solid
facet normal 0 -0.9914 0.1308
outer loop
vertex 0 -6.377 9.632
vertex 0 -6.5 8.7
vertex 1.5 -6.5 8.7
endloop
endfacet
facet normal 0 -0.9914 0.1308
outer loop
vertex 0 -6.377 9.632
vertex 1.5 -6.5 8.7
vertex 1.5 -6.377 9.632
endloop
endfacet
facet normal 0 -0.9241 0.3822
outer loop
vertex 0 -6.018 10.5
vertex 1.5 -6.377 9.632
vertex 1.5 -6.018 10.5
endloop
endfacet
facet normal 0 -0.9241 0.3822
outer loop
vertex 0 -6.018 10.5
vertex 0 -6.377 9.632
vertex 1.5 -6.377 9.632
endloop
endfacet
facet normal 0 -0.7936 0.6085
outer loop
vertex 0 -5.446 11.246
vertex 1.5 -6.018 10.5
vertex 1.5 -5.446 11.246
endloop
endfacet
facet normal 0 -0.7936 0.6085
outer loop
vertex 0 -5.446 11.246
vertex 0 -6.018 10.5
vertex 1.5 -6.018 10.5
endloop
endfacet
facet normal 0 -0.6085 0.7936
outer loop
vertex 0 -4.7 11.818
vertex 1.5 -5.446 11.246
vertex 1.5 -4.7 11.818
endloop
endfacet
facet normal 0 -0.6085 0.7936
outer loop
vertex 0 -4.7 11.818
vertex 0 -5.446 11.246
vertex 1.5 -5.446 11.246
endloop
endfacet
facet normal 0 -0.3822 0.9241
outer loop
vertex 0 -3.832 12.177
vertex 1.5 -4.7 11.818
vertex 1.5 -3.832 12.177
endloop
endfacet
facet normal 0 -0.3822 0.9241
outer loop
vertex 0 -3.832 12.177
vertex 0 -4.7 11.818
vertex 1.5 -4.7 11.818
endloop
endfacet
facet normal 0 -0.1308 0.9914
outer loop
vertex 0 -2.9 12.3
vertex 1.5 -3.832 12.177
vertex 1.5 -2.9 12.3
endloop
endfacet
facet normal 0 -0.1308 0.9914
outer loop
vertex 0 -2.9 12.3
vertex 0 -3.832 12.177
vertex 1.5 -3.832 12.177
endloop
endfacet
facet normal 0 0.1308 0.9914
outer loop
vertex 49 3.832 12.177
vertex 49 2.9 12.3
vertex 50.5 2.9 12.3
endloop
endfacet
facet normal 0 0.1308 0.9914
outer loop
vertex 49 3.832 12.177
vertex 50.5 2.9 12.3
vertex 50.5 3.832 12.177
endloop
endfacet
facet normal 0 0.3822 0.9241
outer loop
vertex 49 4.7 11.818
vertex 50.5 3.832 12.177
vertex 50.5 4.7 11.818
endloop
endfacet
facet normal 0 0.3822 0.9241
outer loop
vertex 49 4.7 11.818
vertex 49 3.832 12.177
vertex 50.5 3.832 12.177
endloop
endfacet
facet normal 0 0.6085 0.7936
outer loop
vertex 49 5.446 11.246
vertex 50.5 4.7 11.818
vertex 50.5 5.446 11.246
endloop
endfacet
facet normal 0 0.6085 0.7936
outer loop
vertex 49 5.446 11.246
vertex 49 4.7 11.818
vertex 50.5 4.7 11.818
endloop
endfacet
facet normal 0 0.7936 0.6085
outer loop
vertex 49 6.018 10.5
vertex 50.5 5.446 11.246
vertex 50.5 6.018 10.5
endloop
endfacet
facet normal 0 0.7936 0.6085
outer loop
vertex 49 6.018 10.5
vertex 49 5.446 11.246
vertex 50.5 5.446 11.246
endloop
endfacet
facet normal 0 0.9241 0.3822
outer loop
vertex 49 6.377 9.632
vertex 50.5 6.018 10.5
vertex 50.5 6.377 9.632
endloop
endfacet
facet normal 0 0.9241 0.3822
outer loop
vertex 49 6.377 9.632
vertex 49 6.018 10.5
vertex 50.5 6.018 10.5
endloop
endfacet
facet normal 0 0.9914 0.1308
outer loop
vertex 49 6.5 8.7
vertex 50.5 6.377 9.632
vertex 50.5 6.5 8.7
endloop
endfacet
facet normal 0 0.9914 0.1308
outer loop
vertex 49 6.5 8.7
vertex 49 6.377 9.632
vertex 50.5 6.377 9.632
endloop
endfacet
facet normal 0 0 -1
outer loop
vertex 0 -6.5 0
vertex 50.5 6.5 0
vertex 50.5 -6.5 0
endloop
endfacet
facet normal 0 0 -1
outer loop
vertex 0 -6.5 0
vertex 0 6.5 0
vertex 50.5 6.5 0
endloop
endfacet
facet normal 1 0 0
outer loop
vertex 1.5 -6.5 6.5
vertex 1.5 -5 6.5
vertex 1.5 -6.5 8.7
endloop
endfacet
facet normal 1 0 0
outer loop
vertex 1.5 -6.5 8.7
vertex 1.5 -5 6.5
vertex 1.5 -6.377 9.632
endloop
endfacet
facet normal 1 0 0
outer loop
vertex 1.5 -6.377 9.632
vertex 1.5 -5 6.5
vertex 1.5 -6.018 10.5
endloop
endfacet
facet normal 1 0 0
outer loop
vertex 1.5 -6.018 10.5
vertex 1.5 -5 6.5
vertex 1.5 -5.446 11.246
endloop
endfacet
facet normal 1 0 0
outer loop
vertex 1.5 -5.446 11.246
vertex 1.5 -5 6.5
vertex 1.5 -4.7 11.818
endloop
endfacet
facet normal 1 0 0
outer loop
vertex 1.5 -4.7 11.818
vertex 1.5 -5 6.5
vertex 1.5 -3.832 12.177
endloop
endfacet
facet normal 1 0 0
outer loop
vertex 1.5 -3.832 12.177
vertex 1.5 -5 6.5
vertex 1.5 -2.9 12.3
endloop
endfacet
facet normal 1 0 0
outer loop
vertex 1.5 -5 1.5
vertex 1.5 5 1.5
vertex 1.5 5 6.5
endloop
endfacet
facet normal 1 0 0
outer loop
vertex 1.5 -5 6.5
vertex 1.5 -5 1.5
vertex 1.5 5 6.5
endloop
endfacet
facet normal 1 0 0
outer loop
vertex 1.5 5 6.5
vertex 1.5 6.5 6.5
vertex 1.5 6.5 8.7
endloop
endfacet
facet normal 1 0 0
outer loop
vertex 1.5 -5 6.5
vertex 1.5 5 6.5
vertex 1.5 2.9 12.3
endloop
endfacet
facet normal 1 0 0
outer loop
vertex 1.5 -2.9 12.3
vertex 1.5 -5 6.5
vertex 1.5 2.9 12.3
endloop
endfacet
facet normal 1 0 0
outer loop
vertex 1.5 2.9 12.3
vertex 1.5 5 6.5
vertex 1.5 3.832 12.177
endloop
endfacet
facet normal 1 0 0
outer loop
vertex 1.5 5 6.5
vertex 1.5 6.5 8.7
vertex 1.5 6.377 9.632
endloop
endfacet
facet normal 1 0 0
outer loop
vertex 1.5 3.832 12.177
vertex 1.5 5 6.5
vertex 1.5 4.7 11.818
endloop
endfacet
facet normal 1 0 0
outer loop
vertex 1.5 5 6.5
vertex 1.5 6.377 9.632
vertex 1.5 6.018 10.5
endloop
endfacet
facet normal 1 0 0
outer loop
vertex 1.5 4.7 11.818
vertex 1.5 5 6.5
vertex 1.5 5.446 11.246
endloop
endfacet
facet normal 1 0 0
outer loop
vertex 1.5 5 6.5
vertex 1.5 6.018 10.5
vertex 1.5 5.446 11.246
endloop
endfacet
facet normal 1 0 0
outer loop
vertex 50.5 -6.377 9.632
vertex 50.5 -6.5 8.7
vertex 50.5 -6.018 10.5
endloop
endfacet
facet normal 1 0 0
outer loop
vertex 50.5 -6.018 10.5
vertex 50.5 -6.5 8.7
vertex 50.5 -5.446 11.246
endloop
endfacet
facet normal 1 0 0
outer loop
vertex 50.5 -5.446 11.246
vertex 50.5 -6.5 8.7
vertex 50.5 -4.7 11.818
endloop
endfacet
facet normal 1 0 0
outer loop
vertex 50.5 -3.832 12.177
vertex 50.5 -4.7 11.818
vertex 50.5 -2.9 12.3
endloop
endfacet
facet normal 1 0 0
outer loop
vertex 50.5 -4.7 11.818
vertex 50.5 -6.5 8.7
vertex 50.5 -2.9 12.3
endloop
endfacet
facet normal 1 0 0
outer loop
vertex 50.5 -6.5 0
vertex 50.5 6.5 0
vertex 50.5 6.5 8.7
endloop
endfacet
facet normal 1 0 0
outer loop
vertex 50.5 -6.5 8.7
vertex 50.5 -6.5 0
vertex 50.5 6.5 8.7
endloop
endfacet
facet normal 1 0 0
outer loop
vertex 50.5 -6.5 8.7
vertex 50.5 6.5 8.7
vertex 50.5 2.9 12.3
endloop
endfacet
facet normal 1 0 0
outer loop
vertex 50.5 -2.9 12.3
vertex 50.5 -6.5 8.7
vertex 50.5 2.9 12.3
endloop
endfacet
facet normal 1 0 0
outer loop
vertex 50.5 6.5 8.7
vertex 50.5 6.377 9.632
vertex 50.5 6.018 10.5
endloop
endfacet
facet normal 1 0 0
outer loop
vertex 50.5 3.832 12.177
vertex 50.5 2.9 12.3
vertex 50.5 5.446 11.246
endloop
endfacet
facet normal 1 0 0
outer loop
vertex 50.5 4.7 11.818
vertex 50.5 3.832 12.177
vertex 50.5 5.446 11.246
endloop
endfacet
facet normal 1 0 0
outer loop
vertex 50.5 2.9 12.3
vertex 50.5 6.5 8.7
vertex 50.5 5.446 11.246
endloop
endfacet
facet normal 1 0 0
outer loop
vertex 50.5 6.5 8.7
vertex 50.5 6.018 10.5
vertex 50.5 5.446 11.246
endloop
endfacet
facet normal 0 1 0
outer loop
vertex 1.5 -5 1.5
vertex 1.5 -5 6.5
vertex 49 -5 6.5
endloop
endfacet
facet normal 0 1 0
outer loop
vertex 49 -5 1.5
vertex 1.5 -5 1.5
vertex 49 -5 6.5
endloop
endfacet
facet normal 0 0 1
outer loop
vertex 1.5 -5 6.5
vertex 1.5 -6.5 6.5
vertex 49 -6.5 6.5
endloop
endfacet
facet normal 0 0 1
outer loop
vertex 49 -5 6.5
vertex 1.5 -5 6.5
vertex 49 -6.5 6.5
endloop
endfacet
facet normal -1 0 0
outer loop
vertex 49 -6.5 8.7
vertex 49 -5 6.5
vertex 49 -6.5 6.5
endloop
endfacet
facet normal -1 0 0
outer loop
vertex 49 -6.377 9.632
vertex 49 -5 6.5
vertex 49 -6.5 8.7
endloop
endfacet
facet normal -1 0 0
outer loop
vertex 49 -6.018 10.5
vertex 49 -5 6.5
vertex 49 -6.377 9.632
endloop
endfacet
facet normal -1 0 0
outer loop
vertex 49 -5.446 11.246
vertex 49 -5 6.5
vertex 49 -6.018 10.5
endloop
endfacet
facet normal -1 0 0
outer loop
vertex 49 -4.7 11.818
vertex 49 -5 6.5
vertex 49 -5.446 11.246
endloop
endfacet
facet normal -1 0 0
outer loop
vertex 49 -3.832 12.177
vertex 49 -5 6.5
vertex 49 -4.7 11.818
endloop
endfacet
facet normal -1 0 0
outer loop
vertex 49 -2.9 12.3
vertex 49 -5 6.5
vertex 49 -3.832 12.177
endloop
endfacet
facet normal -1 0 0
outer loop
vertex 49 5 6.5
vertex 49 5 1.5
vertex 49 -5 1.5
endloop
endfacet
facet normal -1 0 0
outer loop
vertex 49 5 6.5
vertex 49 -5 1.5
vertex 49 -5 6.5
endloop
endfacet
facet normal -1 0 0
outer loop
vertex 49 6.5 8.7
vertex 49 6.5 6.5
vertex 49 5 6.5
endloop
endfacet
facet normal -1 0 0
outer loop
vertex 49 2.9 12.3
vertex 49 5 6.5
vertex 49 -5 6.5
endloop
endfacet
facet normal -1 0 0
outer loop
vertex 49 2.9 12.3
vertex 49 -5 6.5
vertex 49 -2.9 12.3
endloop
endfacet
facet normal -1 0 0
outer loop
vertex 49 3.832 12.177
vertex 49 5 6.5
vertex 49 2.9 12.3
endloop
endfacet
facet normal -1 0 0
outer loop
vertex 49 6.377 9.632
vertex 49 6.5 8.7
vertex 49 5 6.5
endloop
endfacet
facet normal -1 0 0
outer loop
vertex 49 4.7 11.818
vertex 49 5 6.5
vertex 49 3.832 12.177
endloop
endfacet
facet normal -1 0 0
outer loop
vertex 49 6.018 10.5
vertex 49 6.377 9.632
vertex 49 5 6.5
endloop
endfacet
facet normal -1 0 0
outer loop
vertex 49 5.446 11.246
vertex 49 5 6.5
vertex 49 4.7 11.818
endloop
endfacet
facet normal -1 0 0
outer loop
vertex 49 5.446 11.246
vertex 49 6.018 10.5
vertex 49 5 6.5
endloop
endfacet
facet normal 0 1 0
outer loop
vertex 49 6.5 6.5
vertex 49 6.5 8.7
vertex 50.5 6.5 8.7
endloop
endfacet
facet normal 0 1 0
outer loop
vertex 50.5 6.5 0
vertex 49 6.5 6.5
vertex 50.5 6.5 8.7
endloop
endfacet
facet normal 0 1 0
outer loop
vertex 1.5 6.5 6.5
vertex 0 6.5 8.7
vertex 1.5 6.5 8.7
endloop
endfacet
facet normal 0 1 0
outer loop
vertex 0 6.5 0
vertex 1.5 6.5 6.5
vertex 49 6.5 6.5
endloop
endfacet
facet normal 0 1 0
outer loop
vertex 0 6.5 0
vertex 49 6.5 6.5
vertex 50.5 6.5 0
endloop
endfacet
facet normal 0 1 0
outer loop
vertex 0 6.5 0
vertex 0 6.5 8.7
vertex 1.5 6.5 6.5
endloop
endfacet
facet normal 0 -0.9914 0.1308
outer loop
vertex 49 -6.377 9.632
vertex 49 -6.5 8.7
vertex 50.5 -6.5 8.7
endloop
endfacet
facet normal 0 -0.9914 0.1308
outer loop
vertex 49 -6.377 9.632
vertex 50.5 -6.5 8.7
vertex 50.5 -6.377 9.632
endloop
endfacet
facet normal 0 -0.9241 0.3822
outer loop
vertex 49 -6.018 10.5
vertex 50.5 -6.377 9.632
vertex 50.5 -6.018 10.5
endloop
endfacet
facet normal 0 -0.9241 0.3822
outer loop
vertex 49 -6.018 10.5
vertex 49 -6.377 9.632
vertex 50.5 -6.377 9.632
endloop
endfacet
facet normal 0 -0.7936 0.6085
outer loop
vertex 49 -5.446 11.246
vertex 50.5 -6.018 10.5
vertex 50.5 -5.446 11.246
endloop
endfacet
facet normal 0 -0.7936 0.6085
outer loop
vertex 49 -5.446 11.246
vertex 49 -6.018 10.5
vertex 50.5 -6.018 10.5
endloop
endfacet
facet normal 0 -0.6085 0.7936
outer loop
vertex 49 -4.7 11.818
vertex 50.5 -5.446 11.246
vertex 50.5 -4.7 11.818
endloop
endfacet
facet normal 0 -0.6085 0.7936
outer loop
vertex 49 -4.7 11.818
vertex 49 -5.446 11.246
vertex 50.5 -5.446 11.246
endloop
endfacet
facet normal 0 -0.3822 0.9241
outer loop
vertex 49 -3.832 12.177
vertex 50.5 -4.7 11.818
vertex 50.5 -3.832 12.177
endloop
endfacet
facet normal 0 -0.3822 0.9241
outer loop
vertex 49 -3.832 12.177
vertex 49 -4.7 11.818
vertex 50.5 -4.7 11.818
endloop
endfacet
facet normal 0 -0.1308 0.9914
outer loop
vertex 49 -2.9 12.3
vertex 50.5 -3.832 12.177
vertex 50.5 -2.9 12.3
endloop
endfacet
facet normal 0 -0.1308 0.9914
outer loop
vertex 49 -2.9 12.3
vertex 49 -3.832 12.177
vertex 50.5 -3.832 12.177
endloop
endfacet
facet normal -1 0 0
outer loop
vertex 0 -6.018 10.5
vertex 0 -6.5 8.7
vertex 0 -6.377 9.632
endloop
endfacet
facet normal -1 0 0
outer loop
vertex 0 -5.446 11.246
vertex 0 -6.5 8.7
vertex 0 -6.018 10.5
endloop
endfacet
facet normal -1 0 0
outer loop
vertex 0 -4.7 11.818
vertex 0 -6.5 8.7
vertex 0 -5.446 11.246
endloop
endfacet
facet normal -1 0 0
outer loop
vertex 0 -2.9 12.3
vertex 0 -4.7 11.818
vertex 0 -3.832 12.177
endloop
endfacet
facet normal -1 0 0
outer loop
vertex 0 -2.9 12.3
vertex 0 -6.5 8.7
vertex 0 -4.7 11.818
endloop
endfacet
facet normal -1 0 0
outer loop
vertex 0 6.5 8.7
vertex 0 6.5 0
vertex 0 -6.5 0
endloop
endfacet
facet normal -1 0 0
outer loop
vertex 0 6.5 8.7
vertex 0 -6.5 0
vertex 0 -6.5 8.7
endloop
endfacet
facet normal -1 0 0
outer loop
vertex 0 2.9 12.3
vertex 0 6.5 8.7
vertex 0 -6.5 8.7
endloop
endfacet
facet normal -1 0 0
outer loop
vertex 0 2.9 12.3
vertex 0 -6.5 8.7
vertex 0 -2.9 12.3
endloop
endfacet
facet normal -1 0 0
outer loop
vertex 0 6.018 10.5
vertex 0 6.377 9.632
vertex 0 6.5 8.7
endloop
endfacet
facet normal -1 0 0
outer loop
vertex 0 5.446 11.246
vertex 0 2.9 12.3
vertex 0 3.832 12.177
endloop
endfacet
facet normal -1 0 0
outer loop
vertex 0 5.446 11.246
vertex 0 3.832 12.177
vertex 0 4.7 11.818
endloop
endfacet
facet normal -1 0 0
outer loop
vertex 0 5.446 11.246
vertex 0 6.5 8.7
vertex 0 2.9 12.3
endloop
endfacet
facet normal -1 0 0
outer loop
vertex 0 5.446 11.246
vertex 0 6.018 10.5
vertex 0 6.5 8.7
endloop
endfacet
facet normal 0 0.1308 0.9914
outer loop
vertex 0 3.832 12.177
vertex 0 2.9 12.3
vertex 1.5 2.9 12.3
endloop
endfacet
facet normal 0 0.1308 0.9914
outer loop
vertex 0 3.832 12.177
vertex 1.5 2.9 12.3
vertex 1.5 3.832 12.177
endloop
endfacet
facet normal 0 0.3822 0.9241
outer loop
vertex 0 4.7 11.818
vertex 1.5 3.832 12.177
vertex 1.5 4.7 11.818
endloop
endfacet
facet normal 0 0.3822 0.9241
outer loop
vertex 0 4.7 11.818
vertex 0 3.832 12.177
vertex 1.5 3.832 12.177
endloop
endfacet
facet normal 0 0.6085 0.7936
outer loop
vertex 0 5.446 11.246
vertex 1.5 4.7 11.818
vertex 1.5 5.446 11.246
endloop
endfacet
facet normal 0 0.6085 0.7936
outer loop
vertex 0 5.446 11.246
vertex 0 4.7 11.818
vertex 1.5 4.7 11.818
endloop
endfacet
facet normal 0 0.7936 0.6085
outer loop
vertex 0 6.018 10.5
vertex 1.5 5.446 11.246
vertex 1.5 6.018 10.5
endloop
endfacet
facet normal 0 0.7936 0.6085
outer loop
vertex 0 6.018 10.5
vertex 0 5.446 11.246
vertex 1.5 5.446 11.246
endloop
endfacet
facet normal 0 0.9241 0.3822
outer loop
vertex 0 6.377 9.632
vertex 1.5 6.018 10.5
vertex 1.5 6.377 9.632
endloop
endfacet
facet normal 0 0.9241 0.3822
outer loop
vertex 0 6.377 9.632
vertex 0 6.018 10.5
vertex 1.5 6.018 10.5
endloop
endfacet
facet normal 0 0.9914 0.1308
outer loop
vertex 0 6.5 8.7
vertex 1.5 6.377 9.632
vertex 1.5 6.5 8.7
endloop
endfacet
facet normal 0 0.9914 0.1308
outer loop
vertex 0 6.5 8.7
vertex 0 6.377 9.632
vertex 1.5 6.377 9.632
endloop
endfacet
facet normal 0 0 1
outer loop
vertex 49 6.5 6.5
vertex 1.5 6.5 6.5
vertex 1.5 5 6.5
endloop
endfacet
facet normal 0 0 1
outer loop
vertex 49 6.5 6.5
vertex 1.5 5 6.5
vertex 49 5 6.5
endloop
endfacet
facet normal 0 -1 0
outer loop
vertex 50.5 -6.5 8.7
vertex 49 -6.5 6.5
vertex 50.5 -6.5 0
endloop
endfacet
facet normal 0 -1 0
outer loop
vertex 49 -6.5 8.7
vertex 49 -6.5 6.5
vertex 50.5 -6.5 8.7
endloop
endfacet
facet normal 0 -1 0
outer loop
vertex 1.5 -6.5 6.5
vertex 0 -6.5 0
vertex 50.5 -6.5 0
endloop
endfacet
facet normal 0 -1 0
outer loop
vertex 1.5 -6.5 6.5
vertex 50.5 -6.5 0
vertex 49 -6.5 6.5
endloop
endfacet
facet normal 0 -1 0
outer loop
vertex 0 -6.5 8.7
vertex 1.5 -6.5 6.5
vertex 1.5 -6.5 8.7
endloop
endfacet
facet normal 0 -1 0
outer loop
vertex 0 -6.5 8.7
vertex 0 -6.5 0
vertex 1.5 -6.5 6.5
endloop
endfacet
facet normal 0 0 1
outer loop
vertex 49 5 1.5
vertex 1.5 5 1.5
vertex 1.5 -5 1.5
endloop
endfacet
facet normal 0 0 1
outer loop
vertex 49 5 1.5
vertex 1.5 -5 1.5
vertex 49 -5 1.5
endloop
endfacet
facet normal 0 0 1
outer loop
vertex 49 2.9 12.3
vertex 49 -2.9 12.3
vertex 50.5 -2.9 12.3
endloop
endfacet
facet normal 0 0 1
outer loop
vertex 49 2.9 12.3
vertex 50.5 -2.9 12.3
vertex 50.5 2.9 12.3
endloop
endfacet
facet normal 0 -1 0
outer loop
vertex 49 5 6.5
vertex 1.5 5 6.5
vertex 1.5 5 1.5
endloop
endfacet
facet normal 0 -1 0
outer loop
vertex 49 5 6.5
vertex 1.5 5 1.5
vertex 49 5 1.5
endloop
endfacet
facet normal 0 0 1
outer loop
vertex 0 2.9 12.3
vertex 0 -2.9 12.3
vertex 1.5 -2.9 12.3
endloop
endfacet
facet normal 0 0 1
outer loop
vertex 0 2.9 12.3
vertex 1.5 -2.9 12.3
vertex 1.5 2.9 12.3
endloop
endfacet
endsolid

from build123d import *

# Parameters (mm, degrees)
BOSS_EXTRUDE1_DEPTH = 1.5
LPATTERN1_COUNT     = 2
LPATTERN1_PITCH     = 49
SKETCH2_W           = 50.5
SKETCH2_H           = 13
BOSS_EXTRUDE2_DEPTH = 1.5
SKETCH3_W           = 50.5
SKETCH3_H           = 6.5
BOSS_EXTRUDE3_DEPTH = 1.5


with BuildPart() as part:
    # Sketch1 → Boss-Extrude1 (new body)
    with BuildSketch(Plane(origin=(0, 0, 0), x_dir=(0, 0, -1), z_dir=(1, 0, 0))):
        with BuildLine():
            Line((0, 6.5), (0, -6.5))
            Line((0, -6.5), (-8.7, -6.5))
            ThreePointArc((-8.7, -6.5), (-11.245584412, -5.445584412), (-12.3, -2.9))
            Line((-12.3, -2.9), (-12.3, 2.9))
            ThreePointArc((-12.3, 2.9), (-11.245584412, 5.445584412), (-8.7, 6.5))
            Line((-8.7, 6.5), (0, 6.5))
        make_face()
    extrude(amount=BOSS_EXTRUDE1_DEPTH)


with BuildPart() as lpattern1_1:
    # LPattern1: pattern copy
    add(part.part.moved(Location(Vector(1, 0, 0) * (1 * LPATTERN1_PITCH))))


with BuildPart() as part_1:
    add(part.part)

    add(lpattern1_1.part)  # Boss-Extrude2 merges LPattern1_1
    # Sketch2 → Boss-Extrude2 (add)
    with BuildSketch(Plane.XY):
        with Locations((25.25, 0)):
            Rectangle(SKETCH2_W, SKETCH2_H)
    extrude(amount=BOSS_EXTRUDE2_DEPTH)

    # Sketch3 → Boss-Extrude3 (add)
    with BuildSketch(Plane.XZ.offset(6.5)):
        with Locations((25.25, 3.25)):
            Rectangle(SKETCH3_W, SKETCH3_H)
    boss_extrude3 = extrude(amount=-BOSS_EXTRUDE3_DEPTH)

    # Mirror1: Boss-Extrude3 across plane
    add(boss_extrude3.mirror(Plane.ZX))


solid = part_1.part
